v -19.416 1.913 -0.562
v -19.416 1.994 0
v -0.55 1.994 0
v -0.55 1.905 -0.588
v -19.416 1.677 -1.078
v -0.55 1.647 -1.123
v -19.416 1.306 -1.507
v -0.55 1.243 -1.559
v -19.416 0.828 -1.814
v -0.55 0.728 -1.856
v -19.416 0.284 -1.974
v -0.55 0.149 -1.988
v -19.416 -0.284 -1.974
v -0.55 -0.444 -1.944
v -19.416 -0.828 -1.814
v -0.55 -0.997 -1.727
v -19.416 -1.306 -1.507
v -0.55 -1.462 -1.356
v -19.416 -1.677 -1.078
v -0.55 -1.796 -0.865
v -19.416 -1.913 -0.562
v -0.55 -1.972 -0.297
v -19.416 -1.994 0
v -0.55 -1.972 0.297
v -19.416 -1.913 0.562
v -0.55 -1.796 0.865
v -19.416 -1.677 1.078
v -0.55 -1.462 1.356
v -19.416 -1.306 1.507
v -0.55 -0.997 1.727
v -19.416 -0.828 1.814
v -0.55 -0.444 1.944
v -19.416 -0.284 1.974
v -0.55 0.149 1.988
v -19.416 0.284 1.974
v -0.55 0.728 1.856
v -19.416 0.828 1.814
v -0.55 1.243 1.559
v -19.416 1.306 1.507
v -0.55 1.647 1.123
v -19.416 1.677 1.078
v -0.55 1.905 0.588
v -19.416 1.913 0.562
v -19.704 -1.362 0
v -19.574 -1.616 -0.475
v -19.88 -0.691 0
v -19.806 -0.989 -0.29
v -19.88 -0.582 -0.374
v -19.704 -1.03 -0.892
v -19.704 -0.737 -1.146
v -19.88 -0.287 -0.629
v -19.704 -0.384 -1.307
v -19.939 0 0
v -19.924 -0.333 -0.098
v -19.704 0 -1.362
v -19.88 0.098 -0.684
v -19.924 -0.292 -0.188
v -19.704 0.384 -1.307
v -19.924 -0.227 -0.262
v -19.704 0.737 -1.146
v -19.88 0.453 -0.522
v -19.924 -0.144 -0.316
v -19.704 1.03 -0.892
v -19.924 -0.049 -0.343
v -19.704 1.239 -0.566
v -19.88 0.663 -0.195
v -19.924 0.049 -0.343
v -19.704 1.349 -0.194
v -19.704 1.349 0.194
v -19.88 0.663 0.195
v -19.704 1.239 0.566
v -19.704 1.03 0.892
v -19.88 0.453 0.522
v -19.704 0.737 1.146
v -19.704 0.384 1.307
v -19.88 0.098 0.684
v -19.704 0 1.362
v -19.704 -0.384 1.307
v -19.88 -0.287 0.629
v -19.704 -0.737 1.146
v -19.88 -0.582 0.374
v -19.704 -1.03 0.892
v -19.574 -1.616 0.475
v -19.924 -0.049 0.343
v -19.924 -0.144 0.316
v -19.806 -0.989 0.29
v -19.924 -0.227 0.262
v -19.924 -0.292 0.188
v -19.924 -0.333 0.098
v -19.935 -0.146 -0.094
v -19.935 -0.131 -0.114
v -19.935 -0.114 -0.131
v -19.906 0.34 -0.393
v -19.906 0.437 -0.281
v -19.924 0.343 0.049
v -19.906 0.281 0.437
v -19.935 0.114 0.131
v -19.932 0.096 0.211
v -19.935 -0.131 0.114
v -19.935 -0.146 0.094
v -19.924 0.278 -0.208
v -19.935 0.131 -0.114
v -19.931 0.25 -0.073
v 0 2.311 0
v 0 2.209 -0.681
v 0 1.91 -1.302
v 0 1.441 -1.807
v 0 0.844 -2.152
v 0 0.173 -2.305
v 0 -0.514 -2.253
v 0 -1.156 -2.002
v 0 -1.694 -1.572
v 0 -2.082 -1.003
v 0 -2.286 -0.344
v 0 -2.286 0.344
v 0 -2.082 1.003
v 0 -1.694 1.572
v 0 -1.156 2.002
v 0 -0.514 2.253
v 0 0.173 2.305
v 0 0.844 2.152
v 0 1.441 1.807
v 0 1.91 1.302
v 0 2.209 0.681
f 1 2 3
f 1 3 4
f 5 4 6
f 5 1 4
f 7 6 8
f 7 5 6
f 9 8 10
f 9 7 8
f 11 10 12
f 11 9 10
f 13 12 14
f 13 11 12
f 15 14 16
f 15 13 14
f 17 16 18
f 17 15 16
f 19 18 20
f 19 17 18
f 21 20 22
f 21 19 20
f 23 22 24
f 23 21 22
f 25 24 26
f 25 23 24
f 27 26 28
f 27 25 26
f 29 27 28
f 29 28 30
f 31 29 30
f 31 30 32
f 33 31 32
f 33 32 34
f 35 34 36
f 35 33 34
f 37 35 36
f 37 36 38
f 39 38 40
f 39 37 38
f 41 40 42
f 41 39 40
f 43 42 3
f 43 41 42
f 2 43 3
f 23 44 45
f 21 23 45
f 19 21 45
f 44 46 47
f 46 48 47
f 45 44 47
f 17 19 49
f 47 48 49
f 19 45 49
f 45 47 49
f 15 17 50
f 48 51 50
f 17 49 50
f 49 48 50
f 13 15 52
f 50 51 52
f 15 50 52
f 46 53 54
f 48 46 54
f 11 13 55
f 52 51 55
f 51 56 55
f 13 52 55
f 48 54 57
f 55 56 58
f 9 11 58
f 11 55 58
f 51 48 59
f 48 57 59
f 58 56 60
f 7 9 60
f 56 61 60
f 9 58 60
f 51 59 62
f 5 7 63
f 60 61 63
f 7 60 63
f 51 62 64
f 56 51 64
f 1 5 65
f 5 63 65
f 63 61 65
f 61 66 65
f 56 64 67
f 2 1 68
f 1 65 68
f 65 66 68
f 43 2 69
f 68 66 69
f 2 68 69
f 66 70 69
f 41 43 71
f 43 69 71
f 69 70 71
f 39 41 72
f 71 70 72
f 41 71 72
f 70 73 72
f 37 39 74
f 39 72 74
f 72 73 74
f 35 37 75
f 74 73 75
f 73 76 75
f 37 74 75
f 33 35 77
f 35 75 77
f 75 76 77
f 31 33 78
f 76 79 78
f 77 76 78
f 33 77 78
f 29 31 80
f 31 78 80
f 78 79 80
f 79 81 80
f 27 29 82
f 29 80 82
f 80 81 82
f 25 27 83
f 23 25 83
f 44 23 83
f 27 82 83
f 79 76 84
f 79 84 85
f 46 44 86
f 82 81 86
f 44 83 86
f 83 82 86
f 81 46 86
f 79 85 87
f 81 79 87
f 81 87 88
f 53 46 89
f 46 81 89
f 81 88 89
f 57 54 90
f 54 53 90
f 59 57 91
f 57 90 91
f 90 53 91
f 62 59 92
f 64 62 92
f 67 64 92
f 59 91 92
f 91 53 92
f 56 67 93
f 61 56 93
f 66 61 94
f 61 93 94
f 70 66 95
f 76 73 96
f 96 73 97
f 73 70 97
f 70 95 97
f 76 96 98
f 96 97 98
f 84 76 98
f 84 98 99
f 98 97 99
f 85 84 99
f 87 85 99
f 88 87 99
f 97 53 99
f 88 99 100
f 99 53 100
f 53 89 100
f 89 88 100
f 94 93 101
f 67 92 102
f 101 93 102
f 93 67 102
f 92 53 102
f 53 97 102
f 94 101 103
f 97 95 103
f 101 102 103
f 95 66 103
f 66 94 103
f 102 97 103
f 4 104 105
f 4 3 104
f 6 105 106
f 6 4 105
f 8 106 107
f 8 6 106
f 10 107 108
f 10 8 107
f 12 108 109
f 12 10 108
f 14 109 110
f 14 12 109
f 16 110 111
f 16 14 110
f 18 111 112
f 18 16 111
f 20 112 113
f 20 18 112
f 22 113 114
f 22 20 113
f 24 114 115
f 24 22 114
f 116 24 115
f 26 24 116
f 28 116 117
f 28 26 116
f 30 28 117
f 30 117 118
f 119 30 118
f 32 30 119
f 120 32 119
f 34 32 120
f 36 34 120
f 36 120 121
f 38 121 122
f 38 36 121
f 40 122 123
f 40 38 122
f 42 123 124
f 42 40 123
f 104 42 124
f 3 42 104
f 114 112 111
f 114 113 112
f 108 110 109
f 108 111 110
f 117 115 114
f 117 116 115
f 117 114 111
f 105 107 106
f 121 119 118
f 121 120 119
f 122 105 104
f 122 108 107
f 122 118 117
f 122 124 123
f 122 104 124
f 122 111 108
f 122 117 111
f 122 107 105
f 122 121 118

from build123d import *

# Parameters (mm, degrees)
F0_R     = 1.9939
F1_DEPTH = 19.9644


with BuildPart() as f1:
    # F0 (on Right) → F1 (new body)
    with BuildSketch(Plane.YZ):
        Circle(F0_R)
    extrude(amount=-F1_DEPTH)

    # F2 (on Top) → F3 (revolve)
    with BuildSketch(Plane.XY):
        Polygon((-0.549926, 1.9939), (-0.594271, 1.9939), (-0.594271, 0), (0, 0), (0, 1.9939), (0, 2.3114), align=None)
    revolve(axis=Axis((-0.297135, 0, 0), (-1, 0, 0)))

    # F4 (on Top) → F5 (revolve, cut)
    with BuildSketch(Plane.XY):
        with BuildLine():
            Line((-19.939, 0), (-19.9644, 0))
            Line((-19.9644, 0), (-19.9644, -1.9939))
            Line((-19.9644, -1.9939), (-19.416251, -1.9939))
            ThreePointArc((-19.416251, -1.9939), (-19.806141, -1.030643), (-19.939, 0))
        make_face()
    revolve(axis=Axis((-19.9517, 0, 0), (1, 0, 0)), mode=Mode.SUBTRACT)


solid = f1.part
